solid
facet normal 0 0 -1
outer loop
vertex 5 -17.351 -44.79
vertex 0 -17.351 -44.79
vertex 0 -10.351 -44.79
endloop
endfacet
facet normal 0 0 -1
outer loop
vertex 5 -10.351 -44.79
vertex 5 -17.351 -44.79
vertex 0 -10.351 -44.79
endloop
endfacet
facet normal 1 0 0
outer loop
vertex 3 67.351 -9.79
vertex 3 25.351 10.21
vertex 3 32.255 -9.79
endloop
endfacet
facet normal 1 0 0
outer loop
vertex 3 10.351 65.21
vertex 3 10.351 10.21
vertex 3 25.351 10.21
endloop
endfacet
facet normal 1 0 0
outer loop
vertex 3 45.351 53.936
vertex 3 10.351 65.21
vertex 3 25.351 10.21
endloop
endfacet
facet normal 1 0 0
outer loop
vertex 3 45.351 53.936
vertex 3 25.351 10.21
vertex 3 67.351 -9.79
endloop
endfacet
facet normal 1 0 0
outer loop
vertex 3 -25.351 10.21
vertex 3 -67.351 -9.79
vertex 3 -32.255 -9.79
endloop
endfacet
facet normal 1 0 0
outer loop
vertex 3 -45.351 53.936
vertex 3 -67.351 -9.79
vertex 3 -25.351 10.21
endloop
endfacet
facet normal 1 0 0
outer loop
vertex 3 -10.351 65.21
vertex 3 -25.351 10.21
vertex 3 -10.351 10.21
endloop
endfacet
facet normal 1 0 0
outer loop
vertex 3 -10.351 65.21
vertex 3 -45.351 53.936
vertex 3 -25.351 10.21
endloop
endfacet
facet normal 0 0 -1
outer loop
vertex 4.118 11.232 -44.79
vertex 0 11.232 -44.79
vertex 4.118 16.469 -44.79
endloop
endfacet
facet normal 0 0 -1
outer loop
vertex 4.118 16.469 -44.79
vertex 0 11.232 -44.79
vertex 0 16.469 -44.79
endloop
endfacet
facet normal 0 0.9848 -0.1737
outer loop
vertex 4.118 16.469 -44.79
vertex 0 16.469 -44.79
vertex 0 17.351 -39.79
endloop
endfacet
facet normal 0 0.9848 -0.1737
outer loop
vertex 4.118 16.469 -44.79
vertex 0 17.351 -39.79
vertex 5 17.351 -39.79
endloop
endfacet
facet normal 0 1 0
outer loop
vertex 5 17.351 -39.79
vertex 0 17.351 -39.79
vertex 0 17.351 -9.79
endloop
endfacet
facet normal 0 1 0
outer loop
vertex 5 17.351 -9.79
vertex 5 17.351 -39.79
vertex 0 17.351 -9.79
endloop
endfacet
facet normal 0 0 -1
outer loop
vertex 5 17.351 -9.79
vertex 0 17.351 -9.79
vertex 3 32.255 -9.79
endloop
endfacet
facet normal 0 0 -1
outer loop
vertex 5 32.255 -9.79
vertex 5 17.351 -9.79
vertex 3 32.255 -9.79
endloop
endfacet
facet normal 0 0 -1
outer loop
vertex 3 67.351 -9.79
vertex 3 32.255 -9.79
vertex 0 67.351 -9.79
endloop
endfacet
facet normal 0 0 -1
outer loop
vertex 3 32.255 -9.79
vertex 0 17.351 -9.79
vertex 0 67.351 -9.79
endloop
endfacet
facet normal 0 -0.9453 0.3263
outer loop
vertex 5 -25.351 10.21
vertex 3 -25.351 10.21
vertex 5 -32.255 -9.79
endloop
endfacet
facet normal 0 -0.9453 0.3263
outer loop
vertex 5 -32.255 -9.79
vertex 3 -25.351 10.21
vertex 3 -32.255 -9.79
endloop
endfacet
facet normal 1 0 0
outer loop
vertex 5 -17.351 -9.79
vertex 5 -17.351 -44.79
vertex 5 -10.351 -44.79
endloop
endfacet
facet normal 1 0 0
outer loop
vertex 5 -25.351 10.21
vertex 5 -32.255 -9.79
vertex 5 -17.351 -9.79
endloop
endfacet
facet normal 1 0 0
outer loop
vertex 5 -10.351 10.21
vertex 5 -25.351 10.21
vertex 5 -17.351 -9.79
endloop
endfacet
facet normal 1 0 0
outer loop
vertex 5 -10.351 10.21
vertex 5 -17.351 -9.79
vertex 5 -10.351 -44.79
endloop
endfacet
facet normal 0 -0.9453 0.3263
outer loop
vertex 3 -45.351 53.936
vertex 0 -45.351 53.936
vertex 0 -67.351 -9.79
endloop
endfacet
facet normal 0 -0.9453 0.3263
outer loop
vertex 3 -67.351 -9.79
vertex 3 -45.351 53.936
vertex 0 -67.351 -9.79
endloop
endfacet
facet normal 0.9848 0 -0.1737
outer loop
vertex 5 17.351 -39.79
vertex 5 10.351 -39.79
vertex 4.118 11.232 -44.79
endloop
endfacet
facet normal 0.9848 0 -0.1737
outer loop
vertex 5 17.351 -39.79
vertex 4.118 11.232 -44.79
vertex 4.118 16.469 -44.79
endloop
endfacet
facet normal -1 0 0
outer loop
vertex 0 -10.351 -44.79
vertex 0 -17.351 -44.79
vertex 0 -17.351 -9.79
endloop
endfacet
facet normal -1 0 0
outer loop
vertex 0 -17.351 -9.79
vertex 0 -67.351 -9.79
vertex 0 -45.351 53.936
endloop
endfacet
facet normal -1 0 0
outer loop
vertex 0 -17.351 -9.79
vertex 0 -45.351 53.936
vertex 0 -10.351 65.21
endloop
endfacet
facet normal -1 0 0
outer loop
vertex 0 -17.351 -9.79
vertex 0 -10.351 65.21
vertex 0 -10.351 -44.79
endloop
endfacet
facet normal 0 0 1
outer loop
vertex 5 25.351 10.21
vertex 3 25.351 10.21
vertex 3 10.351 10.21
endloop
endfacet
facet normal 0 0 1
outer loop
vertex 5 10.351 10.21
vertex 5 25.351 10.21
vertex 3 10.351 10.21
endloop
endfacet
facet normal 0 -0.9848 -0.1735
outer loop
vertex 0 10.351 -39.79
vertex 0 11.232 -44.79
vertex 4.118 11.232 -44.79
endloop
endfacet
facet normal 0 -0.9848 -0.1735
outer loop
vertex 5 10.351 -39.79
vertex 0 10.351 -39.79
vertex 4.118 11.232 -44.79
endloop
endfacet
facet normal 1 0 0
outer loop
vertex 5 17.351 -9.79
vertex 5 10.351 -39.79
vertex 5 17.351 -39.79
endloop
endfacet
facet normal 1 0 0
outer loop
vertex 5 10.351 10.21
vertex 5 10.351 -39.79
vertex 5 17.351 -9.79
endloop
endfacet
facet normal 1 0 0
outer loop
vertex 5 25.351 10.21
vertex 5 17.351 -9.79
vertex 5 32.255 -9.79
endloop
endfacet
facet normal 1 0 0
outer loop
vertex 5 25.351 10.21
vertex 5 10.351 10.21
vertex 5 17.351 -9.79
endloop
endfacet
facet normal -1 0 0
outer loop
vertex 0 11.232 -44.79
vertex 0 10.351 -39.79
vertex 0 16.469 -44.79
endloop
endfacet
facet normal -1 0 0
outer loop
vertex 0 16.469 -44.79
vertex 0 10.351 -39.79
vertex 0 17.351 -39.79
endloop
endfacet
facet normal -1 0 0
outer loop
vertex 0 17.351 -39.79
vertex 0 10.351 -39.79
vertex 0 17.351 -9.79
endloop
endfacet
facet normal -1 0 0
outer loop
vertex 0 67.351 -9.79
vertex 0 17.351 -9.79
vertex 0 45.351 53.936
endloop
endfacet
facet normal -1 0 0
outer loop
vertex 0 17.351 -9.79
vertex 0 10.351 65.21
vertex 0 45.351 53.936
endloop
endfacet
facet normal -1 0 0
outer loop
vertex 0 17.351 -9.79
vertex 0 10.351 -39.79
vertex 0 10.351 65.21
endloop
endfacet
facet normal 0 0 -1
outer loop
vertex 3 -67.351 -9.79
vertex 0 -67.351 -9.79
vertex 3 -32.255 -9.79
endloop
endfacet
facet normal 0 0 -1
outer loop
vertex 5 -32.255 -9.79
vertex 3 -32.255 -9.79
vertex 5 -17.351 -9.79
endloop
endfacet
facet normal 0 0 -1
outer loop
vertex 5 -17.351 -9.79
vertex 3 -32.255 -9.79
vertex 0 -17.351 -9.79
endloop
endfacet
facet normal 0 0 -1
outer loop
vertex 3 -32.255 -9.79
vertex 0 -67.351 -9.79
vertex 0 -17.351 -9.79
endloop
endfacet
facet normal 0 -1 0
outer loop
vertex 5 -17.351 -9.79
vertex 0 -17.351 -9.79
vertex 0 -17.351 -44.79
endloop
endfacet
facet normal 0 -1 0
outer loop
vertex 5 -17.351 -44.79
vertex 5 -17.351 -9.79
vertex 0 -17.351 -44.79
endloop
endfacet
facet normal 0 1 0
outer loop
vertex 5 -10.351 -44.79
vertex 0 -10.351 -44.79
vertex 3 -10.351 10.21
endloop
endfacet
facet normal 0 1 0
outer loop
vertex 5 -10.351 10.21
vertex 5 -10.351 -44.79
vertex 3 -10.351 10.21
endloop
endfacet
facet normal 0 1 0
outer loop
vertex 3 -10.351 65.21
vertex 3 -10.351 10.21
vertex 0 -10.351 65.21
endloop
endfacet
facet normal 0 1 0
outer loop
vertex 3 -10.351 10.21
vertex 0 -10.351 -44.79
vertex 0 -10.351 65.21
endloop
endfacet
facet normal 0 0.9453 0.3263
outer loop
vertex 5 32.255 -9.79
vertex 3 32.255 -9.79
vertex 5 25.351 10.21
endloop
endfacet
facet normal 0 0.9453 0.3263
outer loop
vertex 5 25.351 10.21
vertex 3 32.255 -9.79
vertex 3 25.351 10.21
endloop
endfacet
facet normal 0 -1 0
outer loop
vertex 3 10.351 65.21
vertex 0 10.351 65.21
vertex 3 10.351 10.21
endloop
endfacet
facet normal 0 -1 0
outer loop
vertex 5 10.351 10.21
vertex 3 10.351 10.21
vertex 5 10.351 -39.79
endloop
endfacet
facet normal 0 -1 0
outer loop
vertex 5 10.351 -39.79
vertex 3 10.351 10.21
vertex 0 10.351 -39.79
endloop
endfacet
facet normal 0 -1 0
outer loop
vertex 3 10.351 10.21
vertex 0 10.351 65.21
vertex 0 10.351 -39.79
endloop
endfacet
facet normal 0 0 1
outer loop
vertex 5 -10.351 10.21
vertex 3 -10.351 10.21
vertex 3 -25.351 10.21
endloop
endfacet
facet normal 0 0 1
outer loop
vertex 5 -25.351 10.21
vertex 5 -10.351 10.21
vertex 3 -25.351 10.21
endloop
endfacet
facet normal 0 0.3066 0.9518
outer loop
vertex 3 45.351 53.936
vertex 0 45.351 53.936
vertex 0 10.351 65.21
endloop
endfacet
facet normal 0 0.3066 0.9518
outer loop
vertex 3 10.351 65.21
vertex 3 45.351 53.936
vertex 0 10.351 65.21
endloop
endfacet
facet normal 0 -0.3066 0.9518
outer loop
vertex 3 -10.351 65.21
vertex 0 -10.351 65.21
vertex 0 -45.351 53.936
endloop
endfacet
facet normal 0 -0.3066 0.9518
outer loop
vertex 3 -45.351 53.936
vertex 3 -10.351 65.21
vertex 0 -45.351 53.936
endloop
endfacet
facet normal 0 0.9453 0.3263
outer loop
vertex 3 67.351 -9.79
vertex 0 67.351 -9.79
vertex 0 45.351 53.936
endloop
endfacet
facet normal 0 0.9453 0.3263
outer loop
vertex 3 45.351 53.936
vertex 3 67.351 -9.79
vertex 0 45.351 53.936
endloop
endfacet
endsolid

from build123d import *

# Parameters (mm, degrees)
F1_DEPTH = 5
F2_DEPTH = 3
F3_DEPTH = 5
F4_DEPTH = 3
F5_SIZE2 = 5
F5_SIZE  = 0.8816349035


with BuildPart() as f1:
    # F0 (on Right) → F1 (new body)
    with BuildSketch(Plane.YZ):
        Polygon((-17.3507910222, -9.7900601104), (-17.3507910222, -44.7900601104), (-10.3507910222, -44.7900601104), (-10.3507910222, 10.2099398896), (-25.3507910222, 10.2099398896), (-32.2552975324, -9.7900601104), align=None)
    extrude(amount=F1_DEPTH)

    # F0 (on Right) → F2 (join)
    with BuildSketch(Plane.YZ):
        Polygon((-25.3507910222, 10.2099398896), (-10.3507910222, 10.2099398896), (-10.3507910222, 65.2099398896), (-45.3507910222, 53.936434947), (-67.3507910222, -9.7900601104), (-32.2552975324, -9.7900601104), align=None)
    extrude(amount=F2_DEPTH)


with BuildPart() as f3:
    # F0 (on Right) → F3 (new body)
    with BuildSketch(Plane.YZ):
        Polygon((10.3507910222, 10.2099398896), (10.3507910222, -44.7900601104), (17.3507910222, -44.7900601104), (17.3507910222, -9.7900601104), (32.2552975324, -9.7900601104), (25.3507910222, 10.2099398896), align=None)
    extrude(amount=F3_DEPTH)

    # F0 (on Right) → F4 (join)
    with BuildSketch(Plane.YZ):
        Polygon((10.3507910222, 65.2099398896), (10.3507910222, 10.2099398896), (25.3507910222, 10.2099398896), (32.2552975324, -9.7900601104), (67.3507910222, -9.7900601104), (45.3507910222, 53.936434947), align=None)
    extrude(amount=F4_DEPTH)

    # F5
    f5_edges = [f3.edges().sort_by_distance(p)[0] for p in [
        (2.5, 17.350791, -44.79006),
        (5, 13.850791, -44.79006),
        (2.5, 10.350791, -44.79006),
    ]]
    f5_side = f3.faces().sort_by_distance((2.5, 13.850791, -44.79006))[0]
    chamfer(f5_edges, length=F5_SIZE, length2=F5_SIZE2, reference=f5_side)


solid = Compound([f1.part, f3.part])
